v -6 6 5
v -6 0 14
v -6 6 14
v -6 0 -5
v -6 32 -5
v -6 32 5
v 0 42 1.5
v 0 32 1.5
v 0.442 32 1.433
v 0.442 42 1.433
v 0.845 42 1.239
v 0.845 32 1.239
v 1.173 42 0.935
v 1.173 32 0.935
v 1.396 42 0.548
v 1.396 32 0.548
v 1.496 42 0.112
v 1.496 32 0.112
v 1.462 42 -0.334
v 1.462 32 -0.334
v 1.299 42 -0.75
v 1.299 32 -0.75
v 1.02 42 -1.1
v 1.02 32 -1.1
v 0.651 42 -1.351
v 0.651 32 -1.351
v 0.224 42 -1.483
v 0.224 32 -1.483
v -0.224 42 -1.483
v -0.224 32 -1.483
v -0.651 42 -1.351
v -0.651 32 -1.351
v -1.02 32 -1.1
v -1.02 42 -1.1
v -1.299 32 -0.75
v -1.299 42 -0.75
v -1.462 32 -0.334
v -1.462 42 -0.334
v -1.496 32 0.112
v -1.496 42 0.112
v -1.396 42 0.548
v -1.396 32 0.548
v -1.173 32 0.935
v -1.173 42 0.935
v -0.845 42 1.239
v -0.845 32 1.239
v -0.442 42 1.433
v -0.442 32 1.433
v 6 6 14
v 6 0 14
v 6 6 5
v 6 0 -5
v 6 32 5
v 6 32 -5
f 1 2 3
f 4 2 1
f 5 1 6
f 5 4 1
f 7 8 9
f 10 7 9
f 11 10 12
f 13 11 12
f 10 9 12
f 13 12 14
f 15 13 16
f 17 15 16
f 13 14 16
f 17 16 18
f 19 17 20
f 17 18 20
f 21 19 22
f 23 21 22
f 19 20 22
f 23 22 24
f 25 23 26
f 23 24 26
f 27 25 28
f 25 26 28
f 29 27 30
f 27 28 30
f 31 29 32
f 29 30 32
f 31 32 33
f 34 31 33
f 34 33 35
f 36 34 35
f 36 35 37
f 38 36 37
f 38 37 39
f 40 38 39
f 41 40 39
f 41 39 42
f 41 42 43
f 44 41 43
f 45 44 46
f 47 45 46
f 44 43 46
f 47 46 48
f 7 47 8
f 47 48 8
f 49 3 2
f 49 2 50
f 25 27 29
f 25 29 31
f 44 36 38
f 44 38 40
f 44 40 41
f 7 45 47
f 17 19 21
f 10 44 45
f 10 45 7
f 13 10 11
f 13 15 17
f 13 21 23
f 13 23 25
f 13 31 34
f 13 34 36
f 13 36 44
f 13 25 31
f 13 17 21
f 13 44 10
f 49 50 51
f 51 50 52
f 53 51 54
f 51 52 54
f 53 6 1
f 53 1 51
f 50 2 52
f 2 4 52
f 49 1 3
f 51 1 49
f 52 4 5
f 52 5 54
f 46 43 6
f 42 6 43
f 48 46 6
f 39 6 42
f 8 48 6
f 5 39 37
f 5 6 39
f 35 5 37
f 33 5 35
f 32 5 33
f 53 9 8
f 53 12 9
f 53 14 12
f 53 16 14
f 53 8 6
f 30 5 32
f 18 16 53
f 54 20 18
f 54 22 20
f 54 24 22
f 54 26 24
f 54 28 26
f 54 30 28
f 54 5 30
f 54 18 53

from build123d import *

# Parameters (mm, degrees)
SKETCH_1_W      = 12
SKETCH_1_H      = 10
EXTRUDE_1_DEPTH = 32
SKETCH_2_R      = 1.5
EXTRUDE_2_DEPTH = 10
SKETCH_3_W      = 12
SKETCH_3_H      = 6
EXTRUDE_3_DEPTH = 9


with BuildPart() as part:
    # 草图1 → 凸台-拉伸1 (new body)
    with BuildSketch(Plane(origin=(0, 0, 0), x_dir=(1, 0, 0), z_dir=(0, 1, 0))):
        Rectangle(SKETCH_1_W, SKETCH_1_H)
    extrude(amount=EXTRUDE_1_DEPTH)

    # 草图2 → 凸台-拉伸2 (add)
    with BuildSketch(Plane(origin=(0, 32, 0), x_dir=(1, 0, 0), z_dir=(0, 1, 0))):
        with Locations(Location((0, 0, 0), (0, 0, 270))):
            Circle(SKETCH_2_R)
    extrude(amount=EXTRUDE_2_DEPTH)

    # 草图3 → 凸台-拉伸3 (add)
    with BuildSketch(Plane.XY.offset(5)):
        with Locations((0, 3)):
            Rectangle(SKETCH_3_W, SKETCH_3_H)
    extrude(amount=EXTRUDE_3_DEPTH)


solid = part.part
